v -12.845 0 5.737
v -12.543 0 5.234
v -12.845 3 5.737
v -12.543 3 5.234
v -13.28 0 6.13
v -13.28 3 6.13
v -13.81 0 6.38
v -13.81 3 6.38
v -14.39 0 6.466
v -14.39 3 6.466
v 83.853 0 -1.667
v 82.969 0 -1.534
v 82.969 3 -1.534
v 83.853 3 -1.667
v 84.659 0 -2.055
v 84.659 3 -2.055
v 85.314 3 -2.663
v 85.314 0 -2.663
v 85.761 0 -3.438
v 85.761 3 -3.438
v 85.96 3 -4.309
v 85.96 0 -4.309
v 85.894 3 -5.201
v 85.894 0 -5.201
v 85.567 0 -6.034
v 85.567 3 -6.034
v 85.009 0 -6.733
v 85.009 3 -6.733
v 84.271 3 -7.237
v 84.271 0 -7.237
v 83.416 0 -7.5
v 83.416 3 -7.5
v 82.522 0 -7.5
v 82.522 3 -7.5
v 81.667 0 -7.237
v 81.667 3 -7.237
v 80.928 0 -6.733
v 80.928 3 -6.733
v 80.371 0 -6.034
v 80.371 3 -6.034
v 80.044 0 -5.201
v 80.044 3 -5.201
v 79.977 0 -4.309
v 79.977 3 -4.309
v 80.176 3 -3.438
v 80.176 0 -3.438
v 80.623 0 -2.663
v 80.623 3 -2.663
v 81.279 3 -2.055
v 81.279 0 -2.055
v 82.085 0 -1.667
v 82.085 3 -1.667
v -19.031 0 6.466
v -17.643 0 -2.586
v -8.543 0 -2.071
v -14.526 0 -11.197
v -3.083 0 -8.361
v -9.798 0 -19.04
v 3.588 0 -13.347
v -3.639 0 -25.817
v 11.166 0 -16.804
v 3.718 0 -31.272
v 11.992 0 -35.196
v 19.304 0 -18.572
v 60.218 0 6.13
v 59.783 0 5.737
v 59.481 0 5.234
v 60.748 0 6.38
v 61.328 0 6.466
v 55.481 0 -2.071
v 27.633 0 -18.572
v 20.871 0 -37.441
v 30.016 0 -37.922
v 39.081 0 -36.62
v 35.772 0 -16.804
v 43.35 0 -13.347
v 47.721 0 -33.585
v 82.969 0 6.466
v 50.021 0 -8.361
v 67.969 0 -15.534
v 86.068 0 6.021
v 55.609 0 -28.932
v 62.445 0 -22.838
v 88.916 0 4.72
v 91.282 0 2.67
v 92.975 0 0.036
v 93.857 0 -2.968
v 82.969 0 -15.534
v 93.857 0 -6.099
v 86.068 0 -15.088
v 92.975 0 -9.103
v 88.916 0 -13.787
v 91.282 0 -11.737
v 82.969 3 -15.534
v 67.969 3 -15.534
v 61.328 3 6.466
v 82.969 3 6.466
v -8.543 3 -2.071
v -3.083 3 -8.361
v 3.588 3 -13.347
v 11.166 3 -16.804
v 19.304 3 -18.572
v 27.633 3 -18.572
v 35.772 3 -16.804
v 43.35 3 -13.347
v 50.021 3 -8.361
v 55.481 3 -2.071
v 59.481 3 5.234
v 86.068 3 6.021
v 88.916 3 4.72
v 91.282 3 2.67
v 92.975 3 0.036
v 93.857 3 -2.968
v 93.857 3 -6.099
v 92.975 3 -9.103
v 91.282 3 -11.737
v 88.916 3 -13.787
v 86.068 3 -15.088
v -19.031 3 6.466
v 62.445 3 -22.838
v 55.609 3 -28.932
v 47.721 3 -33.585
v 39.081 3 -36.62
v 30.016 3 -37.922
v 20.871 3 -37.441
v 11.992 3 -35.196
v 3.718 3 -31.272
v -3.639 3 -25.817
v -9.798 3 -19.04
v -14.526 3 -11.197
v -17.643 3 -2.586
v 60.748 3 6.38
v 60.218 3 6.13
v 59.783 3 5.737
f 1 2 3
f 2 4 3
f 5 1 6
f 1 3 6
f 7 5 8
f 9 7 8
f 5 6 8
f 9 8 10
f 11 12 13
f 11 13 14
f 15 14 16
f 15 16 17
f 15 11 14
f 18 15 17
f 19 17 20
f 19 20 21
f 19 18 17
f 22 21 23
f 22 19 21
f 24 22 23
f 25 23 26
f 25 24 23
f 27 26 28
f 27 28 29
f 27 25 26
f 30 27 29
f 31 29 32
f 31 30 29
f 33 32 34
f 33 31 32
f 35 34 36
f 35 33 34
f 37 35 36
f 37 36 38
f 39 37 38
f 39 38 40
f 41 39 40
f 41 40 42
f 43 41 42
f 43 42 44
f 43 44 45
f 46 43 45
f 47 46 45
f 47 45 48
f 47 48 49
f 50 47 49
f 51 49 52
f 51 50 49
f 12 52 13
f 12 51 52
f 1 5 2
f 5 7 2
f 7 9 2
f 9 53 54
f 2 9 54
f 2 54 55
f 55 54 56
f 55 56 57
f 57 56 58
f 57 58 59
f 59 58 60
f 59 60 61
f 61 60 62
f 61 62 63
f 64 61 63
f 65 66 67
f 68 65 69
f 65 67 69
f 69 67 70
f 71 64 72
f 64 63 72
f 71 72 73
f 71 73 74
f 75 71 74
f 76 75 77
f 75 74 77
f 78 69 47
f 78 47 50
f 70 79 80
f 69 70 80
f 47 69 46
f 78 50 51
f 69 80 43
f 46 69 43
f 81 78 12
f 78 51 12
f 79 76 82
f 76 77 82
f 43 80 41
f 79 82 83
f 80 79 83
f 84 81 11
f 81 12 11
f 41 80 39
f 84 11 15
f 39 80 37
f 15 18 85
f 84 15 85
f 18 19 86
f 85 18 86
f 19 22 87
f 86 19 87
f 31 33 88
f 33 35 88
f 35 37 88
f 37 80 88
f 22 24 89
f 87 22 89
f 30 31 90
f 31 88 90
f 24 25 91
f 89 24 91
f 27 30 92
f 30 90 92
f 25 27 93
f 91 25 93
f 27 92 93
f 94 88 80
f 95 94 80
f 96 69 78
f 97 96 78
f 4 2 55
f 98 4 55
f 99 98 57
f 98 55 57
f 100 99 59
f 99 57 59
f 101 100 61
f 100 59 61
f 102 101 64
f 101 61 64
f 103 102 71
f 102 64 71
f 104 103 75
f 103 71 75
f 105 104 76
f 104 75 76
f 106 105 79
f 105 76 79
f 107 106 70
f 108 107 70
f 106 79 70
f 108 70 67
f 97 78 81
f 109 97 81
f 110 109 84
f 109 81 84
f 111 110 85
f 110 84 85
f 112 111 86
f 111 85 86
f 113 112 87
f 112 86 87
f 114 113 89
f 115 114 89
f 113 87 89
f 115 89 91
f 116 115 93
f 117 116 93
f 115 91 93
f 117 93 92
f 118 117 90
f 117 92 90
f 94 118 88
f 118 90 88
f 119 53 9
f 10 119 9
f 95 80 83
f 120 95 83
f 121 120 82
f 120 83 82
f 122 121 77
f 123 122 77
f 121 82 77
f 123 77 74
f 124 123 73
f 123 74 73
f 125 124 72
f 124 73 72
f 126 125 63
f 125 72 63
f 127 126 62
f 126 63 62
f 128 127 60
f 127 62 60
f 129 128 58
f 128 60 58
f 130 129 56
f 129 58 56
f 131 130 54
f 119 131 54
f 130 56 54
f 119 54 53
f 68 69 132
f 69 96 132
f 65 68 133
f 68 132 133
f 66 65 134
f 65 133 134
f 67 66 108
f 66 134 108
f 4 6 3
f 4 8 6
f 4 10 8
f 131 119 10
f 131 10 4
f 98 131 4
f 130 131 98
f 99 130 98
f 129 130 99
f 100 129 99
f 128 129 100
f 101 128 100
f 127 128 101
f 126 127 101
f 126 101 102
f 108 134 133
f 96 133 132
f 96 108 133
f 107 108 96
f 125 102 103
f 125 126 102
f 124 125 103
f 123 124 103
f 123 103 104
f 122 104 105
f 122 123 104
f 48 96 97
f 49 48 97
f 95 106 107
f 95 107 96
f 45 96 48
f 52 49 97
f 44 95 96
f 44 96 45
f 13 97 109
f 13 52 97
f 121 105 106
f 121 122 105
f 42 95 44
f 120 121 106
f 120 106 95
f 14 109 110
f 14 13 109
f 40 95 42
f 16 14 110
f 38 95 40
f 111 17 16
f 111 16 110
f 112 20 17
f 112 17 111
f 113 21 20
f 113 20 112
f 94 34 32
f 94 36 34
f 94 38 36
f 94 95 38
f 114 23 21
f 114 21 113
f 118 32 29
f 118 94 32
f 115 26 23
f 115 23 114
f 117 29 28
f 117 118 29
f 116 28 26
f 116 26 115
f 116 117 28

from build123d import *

# Parameters (mm, degrees)
CROQUIS1_R              = 3
SALIENTE_EXTRUIR1_DEPTH = 3
REDONDEO1_R             = 2
REDONDEO2_R             = 2


with BuildPart() as part:
    # Croquis1 → Saliente-Extruir1 (new body)
    with BuildSketch(Plane(origin=(0, 0, 0), x_dir=(1, 0, 0), z_dir=(0, 1, 0))):
        with BuildLine():
            Line((59.968853779, -6.466358732), (82.968853779, -6.466358732))
            ThreePointArc((82.968853779, -6.466358732), (93.968853779, 4.533641268), (82.968853779, 15.533641268))
            Line((82.968853779, 15.533641268), (67.968853779, 15.533641268))
            ThreePointArc((67.968853779, 15.533641268), (16.376491879, 36.535254234), (-19.031146221, -6.466358732))
            Line((-19.031146221, -6.466358732), (-13.031146221, -6.466358732))
            ThreePointArc((-13.031146221, -6.466358732), (23.468853779, 18.795009604), (59.968853779, -6.466358732))
        make_face()
        with Locations(Location((82.968853779, 4.533641268, 0), (0, 0, 270))):
            Circle(CROQUIS1_R, mode=Mode.SUBTRACT)
    extrude(amount=SALIENTE_EXTRUIR1_DEPTH)

    # Redondeo1
    redondeo1_edges = [part.edges().sort_by_distance(p)[0] for p in [
        (59.968853779, 1.5, 6.466358732),
    ]]
    fillet(redondeo1_edges, radius=REDONDEO1_R)

    # Redondeo2
    redondeo2_edges = [part.edges().sort_by_distance(p)[0] for p in [
        (-13.031146221, 1.5, 6.466358732),
    ]]
    fillet(redondeo2_edges, radius=REDONDEO2_R)


solid = part.part
